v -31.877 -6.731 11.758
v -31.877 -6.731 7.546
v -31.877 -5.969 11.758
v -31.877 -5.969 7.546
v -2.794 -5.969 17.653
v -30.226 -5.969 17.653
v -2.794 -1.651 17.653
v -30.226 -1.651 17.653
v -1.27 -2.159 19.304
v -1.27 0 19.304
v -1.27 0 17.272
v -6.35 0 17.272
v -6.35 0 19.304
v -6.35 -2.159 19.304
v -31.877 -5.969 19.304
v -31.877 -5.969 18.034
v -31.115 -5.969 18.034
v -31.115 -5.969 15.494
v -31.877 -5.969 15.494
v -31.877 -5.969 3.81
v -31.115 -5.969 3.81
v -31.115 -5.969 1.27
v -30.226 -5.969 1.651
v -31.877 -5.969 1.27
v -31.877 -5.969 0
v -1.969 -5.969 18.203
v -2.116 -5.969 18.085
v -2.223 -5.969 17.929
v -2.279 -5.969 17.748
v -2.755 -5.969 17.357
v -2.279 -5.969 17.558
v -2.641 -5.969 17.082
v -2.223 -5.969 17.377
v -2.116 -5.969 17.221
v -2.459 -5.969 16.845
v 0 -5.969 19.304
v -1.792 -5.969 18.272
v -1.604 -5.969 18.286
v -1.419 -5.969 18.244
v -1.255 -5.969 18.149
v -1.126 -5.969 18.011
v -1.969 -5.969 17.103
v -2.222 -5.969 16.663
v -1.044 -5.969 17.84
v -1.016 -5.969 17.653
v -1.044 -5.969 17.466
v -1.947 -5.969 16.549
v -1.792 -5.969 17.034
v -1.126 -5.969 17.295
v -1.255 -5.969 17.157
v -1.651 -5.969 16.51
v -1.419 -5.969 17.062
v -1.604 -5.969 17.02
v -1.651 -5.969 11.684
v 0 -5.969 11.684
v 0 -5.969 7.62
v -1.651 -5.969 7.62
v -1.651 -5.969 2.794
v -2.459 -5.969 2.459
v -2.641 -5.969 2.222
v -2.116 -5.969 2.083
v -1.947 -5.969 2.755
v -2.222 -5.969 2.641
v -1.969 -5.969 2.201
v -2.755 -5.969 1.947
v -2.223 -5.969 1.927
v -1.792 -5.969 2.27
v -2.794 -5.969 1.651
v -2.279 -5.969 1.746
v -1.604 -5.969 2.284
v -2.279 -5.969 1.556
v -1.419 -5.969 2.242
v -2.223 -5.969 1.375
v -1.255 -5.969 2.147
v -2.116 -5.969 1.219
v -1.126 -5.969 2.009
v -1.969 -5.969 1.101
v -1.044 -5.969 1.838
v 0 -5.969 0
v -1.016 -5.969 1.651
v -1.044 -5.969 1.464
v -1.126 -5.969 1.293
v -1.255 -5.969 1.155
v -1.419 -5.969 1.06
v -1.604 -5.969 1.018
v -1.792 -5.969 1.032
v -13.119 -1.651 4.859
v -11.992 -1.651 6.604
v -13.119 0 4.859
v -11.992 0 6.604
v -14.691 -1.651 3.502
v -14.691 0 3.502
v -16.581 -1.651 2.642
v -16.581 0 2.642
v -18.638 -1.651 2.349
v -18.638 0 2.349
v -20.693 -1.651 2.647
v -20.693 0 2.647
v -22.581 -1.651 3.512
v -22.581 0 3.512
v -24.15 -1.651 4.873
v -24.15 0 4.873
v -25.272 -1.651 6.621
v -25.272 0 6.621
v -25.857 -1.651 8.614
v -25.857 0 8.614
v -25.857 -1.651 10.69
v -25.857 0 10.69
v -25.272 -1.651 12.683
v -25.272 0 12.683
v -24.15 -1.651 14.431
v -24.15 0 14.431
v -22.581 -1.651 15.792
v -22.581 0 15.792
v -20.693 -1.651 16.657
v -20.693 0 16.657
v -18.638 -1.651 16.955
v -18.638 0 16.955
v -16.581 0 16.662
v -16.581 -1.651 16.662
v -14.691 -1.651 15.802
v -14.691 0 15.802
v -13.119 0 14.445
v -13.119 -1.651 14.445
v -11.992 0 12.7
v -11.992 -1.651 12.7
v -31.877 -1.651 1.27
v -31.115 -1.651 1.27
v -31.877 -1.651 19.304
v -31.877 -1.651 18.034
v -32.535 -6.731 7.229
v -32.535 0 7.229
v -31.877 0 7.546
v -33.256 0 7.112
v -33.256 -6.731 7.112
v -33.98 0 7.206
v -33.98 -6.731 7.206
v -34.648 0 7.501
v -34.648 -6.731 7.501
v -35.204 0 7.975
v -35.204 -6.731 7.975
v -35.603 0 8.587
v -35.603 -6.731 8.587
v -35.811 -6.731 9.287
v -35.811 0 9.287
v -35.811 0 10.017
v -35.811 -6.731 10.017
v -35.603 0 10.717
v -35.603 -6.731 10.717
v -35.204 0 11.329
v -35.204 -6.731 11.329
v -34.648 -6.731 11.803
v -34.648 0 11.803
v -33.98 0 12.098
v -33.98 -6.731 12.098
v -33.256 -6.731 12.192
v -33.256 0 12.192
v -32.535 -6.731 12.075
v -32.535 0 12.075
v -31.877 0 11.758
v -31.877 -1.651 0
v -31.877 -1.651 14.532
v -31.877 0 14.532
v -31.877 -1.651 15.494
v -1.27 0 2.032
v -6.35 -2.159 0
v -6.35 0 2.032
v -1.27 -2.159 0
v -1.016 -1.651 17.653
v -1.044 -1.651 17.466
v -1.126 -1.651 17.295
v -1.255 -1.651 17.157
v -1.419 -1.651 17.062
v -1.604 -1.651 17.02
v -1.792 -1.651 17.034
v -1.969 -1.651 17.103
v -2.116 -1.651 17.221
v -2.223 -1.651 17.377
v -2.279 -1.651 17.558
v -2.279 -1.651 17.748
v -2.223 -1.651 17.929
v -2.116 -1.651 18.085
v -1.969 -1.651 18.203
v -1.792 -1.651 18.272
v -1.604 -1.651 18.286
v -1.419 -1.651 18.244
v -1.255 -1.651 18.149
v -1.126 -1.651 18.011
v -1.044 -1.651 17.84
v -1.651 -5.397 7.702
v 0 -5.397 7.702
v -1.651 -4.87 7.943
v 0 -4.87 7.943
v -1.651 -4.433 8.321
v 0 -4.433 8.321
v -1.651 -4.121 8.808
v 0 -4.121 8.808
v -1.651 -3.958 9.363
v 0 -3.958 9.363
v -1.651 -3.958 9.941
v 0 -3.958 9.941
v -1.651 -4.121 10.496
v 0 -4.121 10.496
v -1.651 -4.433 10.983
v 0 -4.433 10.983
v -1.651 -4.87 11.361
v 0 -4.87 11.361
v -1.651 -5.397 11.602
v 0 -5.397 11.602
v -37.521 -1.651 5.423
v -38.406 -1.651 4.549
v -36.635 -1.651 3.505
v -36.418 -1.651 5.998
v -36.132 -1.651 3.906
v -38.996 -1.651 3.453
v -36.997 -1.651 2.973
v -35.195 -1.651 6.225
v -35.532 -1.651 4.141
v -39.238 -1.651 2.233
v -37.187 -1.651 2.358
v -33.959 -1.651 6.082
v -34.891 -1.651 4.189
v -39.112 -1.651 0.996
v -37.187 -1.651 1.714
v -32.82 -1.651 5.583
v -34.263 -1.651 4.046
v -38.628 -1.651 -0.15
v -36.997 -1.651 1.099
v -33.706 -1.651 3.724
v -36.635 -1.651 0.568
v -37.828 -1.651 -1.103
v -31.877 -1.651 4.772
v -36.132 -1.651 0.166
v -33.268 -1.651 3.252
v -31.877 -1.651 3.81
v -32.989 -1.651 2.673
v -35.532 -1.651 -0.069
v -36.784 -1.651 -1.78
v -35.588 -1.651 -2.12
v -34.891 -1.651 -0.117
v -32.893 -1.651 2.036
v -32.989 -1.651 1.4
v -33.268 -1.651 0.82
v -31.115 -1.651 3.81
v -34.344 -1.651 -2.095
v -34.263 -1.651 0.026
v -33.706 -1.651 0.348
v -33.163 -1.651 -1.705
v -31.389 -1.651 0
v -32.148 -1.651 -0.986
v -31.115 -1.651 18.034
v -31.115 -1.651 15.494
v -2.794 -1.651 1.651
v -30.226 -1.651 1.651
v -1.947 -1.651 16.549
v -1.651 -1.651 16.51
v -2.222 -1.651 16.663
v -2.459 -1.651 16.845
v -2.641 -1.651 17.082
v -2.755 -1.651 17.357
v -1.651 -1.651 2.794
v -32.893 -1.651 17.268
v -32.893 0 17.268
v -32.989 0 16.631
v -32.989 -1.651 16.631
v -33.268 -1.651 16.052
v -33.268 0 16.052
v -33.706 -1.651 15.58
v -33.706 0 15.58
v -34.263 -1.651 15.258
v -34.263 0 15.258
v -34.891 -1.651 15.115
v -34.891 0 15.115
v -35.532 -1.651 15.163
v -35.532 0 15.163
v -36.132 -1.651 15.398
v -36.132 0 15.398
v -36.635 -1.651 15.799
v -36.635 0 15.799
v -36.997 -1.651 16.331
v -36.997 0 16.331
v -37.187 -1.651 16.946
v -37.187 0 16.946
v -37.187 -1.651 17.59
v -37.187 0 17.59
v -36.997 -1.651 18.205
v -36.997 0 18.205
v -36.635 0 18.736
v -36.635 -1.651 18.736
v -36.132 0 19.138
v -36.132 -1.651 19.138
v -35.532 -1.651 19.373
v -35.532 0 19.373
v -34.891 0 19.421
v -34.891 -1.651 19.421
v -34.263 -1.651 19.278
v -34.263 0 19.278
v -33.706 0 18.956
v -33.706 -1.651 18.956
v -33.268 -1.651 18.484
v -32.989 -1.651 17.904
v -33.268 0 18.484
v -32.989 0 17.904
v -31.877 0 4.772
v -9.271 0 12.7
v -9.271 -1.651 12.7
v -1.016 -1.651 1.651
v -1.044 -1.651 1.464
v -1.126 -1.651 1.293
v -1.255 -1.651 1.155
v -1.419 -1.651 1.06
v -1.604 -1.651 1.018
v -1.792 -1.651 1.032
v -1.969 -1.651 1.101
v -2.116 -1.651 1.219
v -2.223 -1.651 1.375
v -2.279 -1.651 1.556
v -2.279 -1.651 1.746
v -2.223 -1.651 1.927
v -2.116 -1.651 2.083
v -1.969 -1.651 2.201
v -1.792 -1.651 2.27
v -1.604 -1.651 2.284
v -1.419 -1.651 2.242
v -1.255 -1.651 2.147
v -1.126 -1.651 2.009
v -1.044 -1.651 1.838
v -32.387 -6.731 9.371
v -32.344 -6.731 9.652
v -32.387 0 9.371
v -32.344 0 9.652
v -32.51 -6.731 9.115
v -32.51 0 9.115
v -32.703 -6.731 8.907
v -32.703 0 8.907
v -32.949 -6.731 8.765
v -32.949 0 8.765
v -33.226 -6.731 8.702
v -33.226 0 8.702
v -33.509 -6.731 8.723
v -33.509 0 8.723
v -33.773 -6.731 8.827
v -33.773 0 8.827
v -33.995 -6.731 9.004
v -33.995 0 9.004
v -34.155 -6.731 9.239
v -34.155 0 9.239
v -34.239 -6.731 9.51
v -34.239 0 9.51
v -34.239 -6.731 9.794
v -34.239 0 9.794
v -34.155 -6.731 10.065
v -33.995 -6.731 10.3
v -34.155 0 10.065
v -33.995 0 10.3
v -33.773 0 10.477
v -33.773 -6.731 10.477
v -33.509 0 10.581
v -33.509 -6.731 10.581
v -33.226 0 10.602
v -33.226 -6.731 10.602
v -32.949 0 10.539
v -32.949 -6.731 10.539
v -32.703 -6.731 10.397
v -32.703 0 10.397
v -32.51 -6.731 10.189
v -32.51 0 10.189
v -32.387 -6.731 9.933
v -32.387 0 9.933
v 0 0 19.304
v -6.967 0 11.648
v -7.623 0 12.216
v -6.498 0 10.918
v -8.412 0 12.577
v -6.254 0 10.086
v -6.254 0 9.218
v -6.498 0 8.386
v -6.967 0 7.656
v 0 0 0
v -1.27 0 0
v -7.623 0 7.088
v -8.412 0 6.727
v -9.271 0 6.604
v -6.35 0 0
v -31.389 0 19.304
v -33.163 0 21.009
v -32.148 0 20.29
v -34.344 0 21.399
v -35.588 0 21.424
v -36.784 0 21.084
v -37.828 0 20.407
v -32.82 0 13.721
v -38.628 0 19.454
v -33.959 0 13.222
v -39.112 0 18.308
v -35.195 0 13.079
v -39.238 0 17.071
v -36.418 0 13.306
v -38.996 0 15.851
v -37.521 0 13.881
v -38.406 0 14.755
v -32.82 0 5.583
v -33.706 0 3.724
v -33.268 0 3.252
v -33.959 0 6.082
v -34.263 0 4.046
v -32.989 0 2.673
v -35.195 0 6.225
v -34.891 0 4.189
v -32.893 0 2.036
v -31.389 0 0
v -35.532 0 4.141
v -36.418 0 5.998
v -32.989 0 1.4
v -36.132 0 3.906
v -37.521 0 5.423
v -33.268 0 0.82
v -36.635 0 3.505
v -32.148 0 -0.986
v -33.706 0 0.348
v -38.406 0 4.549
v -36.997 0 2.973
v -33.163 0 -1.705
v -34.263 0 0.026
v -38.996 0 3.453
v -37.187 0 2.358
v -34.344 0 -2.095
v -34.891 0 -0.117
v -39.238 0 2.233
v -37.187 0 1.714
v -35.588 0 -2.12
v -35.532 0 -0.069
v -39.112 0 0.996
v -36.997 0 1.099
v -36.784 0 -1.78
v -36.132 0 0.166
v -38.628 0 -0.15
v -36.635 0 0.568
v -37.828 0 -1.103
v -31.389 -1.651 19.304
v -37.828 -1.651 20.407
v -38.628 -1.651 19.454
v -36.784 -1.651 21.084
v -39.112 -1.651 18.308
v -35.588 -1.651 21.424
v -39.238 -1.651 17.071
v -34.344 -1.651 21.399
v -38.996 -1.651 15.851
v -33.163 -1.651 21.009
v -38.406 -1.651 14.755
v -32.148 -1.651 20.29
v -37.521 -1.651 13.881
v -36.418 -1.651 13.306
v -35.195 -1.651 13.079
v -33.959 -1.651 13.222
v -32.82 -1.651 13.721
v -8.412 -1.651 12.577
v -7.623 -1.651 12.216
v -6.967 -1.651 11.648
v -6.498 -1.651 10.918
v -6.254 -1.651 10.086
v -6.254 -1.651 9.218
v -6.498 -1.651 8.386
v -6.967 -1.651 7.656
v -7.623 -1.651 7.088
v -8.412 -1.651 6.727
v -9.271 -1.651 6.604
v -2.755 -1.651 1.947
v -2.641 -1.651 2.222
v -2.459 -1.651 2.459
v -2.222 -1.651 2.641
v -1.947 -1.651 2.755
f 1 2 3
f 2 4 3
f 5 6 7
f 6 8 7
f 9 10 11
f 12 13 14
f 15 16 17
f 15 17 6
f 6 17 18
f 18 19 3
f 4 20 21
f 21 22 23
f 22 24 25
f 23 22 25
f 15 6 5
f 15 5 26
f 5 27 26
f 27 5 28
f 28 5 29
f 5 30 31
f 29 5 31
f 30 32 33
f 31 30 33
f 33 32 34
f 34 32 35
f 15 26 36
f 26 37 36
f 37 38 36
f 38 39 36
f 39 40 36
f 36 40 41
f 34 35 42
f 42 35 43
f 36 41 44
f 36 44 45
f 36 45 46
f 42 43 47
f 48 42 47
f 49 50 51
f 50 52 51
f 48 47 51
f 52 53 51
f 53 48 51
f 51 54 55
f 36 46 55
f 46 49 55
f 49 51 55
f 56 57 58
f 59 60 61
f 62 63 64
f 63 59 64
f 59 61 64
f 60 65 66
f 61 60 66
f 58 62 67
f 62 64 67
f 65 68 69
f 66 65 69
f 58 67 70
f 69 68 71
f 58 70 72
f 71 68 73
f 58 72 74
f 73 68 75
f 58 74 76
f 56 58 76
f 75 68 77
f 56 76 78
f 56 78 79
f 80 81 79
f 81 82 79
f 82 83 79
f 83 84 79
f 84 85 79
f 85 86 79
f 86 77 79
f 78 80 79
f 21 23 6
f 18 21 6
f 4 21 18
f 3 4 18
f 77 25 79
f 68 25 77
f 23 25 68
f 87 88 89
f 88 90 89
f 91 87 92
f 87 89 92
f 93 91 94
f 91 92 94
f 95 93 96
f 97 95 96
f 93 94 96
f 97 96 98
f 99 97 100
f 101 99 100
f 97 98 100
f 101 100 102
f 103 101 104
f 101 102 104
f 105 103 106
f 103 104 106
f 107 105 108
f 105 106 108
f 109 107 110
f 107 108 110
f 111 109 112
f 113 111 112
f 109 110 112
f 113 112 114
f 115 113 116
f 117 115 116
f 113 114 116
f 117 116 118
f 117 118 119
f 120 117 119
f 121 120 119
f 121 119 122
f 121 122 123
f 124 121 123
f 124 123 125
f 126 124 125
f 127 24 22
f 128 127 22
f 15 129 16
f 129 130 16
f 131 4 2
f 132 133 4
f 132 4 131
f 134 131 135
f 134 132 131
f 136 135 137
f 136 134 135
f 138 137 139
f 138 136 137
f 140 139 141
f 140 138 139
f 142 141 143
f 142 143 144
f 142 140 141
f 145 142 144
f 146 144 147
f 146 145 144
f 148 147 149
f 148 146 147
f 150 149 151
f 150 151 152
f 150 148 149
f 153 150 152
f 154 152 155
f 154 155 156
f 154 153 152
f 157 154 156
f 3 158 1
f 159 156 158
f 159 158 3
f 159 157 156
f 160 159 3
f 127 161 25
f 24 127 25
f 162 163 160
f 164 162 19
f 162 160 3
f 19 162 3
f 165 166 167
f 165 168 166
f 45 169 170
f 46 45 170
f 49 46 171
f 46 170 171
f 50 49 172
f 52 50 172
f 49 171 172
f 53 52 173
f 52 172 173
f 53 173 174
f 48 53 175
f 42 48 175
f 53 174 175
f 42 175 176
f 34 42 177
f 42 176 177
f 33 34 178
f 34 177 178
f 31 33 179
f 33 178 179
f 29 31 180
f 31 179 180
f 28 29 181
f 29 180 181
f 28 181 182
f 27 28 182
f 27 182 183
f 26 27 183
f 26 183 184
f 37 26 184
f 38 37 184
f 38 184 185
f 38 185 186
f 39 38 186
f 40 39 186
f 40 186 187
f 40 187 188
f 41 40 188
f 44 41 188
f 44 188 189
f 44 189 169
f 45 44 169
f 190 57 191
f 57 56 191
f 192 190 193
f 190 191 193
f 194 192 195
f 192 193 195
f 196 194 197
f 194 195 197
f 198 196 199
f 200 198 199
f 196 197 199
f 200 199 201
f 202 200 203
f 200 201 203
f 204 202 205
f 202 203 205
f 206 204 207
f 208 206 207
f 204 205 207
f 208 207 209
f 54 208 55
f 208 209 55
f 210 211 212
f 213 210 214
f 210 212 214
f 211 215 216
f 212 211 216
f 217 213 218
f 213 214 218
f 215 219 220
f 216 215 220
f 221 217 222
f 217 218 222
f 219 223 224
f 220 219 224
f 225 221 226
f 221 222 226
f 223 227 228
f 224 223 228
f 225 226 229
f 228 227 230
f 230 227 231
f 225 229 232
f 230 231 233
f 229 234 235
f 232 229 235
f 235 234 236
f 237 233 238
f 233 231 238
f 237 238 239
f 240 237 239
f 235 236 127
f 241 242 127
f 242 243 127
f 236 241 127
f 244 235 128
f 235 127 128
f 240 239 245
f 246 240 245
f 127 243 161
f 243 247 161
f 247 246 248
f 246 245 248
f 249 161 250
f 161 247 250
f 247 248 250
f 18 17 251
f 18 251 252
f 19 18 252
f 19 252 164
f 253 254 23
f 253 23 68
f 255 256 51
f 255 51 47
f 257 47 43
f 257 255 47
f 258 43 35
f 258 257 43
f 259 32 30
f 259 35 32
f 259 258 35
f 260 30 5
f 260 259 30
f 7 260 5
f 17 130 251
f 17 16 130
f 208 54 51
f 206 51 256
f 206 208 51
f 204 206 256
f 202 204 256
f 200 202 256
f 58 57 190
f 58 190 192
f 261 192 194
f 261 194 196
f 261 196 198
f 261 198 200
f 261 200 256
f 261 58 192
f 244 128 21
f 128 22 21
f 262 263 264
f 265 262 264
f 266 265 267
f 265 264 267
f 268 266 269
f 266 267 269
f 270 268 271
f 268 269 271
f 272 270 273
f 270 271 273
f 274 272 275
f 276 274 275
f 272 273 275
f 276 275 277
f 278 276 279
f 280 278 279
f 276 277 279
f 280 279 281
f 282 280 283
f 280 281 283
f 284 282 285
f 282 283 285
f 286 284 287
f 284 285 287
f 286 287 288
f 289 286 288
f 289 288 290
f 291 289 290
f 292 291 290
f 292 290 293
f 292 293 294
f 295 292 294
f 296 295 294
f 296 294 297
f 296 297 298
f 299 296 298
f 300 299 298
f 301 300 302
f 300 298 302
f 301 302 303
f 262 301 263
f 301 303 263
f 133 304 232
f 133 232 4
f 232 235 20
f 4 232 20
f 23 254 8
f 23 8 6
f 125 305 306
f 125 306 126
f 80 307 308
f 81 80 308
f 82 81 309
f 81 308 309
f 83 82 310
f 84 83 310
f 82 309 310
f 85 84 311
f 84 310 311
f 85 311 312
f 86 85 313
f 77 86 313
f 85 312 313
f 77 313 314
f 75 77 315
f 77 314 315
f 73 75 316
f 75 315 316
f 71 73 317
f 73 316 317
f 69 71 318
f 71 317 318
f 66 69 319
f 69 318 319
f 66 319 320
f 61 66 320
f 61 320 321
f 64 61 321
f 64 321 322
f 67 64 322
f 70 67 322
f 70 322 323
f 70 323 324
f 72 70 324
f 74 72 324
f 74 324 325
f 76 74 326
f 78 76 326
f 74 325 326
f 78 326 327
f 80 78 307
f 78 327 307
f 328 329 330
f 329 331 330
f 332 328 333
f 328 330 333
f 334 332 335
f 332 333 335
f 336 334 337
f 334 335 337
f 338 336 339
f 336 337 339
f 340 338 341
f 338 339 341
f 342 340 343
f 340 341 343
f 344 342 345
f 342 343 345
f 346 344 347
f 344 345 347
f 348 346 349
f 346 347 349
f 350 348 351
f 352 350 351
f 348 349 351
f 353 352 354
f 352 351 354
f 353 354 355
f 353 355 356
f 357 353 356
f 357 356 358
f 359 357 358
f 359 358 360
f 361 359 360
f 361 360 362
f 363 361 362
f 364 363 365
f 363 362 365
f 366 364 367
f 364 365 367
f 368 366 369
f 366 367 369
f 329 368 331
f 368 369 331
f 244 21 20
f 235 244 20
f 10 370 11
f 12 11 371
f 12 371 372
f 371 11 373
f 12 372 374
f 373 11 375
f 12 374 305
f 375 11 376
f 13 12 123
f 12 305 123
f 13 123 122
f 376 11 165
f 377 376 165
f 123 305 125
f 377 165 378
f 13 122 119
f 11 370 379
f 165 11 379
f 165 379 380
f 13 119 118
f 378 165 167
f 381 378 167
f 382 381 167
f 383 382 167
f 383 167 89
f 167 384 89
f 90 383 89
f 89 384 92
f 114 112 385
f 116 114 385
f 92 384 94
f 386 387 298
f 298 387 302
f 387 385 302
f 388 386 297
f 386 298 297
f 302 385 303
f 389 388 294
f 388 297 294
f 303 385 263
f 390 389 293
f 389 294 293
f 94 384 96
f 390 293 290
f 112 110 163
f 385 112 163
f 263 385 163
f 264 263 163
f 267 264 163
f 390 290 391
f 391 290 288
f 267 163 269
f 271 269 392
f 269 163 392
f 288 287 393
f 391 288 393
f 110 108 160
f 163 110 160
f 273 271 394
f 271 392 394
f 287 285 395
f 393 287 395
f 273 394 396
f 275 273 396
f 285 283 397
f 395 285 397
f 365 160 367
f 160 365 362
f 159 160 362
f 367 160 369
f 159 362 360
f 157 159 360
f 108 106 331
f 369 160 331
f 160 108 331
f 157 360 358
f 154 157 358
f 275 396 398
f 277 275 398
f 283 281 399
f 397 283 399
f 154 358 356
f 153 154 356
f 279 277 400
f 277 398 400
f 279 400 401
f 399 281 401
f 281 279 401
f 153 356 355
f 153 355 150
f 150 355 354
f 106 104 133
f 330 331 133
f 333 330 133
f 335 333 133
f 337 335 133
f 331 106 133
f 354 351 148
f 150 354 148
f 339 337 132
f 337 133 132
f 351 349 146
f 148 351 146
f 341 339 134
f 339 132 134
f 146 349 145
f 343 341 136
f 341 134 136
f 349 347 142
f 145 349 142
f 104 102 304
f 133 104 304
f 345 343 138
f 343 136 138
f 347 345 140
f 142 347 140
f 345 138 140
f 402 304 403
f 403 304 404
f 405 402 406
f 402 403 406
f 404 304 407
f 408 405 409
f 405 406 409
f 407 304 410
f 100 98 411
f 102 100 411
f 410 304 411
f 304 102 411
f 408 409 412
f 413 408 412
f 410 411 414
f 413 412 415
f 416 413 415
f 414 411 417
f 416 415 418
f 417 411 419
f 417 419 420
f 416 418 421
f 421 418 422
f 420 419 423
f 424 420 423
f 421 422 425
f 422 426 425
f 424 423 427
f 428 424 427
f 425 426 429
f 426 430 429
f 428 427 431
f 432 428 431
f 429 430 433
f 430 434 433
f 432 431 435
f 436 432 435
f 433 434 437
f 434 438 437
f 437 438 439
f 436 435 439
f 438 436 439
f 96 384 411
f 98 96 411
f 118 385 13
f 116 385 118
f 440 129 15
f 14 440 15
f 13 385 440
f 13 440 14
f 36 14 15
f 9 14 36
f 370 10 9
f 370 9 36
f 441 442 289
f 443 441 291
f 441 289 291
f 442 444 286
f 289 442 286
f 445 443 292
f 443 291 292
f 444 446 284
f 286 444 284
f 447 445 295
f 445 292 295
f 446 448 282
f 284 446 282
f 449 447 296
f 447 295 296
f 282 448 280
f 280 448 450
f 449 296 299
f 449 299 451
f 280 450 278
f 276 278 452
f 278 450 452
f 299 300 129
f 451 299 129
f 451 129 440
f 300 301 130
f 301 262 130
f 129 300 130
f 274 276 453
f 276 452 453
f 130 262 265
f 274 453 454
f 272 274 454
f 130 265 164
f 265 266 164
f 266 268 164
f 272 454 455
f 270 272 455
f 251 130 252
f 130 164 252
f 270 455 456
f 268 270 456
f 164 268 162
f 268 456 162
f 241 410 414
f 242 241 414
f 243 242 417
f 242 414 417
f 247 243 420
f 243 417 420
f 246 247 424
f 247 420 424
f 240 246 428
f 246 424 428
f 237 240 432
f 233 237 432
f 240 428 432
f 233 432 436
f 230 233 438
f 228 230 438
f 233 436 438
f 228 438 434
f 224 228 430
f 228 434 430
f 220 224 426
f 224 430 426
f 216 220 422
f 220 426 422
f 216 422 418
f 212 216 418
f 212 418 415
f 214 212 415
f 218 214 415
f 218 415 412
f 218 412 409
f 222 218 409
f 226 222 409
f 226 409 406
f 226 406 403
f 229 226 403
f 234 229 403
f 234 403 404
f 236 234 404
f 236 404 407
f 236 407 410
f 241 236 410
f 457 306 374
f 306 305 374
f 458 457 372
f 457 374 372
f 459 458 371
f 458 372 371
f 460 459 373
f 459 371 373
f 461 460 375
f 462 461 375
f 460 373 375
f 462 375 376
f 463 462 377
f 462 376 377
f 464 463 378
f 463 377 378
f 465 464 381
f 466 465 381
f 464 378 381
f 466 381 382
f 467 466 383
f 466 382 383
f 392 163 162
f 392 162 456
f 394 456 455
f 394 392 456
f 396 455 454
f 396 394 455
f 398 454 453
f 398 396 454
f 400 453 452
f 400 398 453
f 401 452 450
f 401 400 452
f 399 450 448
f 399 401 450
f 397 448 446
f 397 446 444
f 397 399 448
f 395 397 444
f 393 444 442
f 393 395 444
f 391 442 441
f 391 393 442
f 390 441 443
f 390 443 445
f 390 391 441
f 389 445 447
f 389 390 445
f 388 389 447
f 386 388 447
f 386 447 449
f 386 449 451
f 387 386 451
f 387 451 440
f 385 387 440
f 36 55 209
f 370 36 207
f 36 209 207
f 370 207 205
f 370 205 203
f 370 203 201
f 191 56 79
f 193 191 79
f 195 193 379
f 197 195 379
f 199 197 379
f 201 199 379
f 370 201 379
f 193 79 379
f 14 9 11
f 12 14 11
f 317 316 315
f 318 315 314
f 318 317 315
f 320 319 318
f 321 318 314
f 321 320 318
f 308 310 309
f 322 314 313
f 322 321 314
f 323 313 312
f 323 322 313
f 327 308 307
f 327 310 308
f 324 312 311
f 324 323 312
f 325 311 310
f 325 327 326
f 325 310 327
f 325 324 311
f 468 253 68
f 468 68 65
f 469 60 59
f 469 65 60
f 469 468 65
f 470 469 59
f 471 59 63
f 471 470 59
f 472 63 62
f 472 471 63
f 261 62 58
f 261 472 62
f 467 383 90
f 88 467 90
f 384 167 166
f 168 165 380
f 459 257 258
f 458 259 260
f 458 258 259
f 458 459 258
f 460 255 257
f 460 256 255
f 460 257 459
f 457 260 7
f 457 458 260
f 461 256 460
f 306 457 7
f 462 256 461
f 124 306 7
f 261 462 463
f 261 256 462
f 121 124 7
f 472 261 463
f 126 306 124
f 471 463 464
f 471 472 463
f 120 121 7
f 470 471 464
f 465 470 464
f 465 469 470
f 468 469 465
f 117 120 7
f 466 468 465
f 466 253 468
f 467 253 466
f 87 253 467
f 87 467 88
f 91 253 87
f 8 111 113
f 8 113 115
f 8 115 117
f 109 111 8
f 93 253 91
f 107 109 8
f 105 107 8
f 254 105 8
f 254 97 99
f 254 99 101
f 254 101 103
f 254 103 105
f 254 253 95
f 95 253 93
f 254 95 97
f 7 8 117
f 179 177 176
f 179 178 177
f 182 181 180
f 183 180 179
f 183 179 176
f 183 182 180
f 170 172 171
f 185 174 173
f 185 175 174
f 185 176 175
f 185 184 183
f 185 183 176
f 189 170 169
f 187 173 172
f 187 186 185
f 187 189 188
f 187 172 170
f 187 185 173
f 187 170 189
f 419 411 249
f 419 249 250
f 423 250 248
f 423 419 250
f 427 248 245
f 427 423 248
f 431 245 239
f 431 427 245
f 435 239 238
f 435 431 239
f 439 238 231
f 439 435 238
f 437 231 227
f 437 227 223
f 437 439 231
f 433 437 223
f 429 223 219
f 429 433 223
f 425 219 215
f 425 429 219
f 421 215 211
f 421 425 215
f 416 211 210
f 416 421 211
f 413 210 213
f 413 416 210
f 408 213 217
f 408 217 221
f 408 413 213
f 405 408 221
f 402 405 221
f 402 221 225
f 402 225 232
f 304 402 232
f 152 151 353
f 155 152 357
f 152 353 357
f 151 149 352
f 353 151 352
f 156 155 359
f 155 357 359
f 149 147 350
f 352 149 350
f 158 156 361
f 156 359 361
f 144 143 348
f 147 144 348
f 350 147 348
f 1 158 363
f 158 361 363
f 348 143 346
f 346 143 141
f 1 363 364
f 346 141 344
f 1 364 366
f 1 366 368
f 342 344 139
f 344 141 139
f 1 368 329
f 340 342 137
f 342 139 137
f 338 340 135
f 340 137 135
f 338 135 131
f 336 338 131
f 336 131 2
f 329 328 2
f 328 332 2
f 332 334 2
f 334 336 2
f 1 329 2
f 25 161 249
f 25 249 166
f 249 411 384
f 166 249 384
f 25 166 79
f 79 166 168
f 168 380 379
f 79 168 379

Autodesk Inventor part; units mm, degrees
ref_plane "YZ Plane" through (0, 0, 0) normal (1, 0, 0) x (0, 1, 0)
ref_plane "XZ Plane" through (0, 0, 0) normal (0, 1, 0) x (-1, 0, 0)
ref_plane "XY Plane" through (0, 0, 0) normal (0, 0, 1) x (1, 0, 0)
sketch "Sketch1" plane through (0, 0, 0) normal (0, 0, 1) x (1, 0, 0)
  line L0 (0, 0) -> (-31.877, 0)
  line L1 (-31.877, 0) -> (-31.877, -5.969)
  line L2 (-31.877, -5.969) -> (0, -5.969)
  line L3 (0, -5.969) -> (0, 0)
  dimension "d0" = 31.877
  dimension "d1" = 5.969
extrude "Extrusion1" add sketch "Sketch1" along normal blind 19.304
shell "Shell1" thickness 1.651 removed faces 1 at (-21.2513, -5.969, 12.8693)
sketch "Sketch2" plane through (-31.877, 0, 0) normal (0, 1, 0) x (1, 0, 0)
  arc A0 (19.8846, -6.604) -> (19.8846, -12.7) centre (13.2486, -9.652) ccw
  arc A1 (0, -7.5459) -> (0, -11.7581) centre (-1.4199, -9.652) ccw
  line L0 (0, 0) -> (0, -19.304) projected
  line L1 (0, 0) -> (0, -19.304) projected
  circle A2 centre (-1.4199, -9.652) radius 0.9525
  arc A3 (22.606, -12.7) -> (22.606, -6.604) centre (22.606, -9.652) ccw
  line L2 (31.877, 0) -> (31.877, -19.304) projected
  line L3 (22.606, -12.7) -> (19.8846, -12.7)
  line L4 (22.606, -6.604) -> (19.8846, -6.604)
  circle A4 centre (-3.175, -17.2678) radius 2.159
  arc A5 (0, -14.5321) -> (0.4881, -19.304) centre (-3.175, -17.2678) ccw
  line L5 (31.877, -19.304) -> (0, -19.304) construction
  line L6 (13.2486, -9.652) -> (-12.5267, -9.652) construction
  circle A6 centre (-3.175, -2.0362) radius 2.159
  arc A7 (0.4881, 0) -> (0, -4.7719) centre (-3.175, -2.0362) ccw
  line L7 (31.877, 0) -> (0, 0) projected
  line L8 (0, 0) -> (0, -19.304) projected
  line L9 (31.877, -19.304) -> (0, -19.304) projected
  line L10 (31.877, 0) -> (31.877, -19.304) projected
  point P0 (-3.9599, -9.652)
  point P1 (0, -9.652)
  point P2 (5.9461, -9.652)
  point P3 (13.2486, -2.3495)
  point P4 (25.654, -9.652)
  point P5 (-7.366, -17.2678)
  point P6 (-1.4199, -12.192)
  point P7 (-1.4199, -13.462)
  point P8 (0.4881, 0)
  point P9 (0, -4.7719)
  point P10 (0.4881, -19.304)
  point P11 (0, -14.5321)
  dimension "d5" = 14.605
  dimension "d6" = 5.08
  dimension "d8" = 1.905
  dimension "d11" = 9.906
  dimension "d12" = 6.223
  dimension "d13" = 6.096
  dimension "d16" = 4.318
  dimension "d17" = 2.032
  dimension "d18" = 7.366
  dimension "d19" = 1.27
extrude "Extrusion2" add sketch "Sketch2" against normal blind 6.731 contours L0 A1
extrude "Extrusion3" cut sketch "Sketch2" against normal through all contours L4 A3 L3 A0
extrude "Extrusion4" add sketch "Sketch2" against normal blind 1.651 contours A7 L7 L0 | L0 L9 A5
sketch "Sketch3" plane through (0, -5.969, 0) normal (1, 0, 0) x (0, 0, -1)
  line L0 (0, 0) -> (-19.304, 0) projected
  arc A0 (-7.62, 0) -> (-11.684, 0) centre (-9.652, 0) ccw
  line L1 (0, 0) -> (0, 5.969) projected
  line L2 (0, 5.969) -> (-19.304, 5.969) projected
  line L3 (-19.304, 0) -> (-19.304, 5.969) projected
  line L4 (0, 0) -> (-19.304, 0) projected
  point P0 (-7.62, 0)
extrude "Extrusion5" cut sketch "Sketch3" against normal up to surface (1.651 mm away) contours L0 A0
ref_plane "Work Plane1" through (-1.27, -5.969, 0) normal (1, 0, 0) x (0, 0, -1)
sketch "Sketch4" plane through (-1.27, -5.969, 0) normal (1, 0, 0) x (0, 0, -1)
  line L0 (0, 4.318) -> (0, 0) projected
  line L1 (0, 3.81) -> (-2.032, 5.969)
  line L2 (-4.1952, 5.969) -> (0.1228, 5.969) projected
  line L3 (-2.032, 5.969) -> (0, 5.969)
  line L4 (0, 3.81) -> (0, 5.969)
  line L5 (0, 5.969) -> (-19.304, 5.969) construction
  line L6 (-9.652, 5.969) -> (-9.652, 0) construction
  line L7 (-1.651, 0) -> (-17.653, 0) construction
  line L8 (-19.304, 3.81) -> (-17.272, 5.969)
  line L9 (-19.304, 3.81) -> (-19.304, 5.969)
  line L10 (-19.304, 5.969) -> (-19.304, 4.318) projected
  line L11 (-19.304, 5.969) -> (-17.272, 5.969)
  dimension "d27" = 3.81
  dimension "d28" = 2.032
extrude "Extrusion6" cut sketch "Sketch4" against normal blind 5.08
sketch "Sketch5" plane through (-31.877, -5.969, 0) normal (0, -1, 0) x (1, 0, 0)
  line L0 (0, 11.7581) -> (0, 19.304) projected
  line L1 (0, 18.034) -> (0.762, 18.034)
  line L2 (0.762, 18.034) -> (0.762, 15.494)
  line L3 (0.762, 15.494) -> (0, 15.494)
  line L4 (0, 15.494) -> (0, 18.034)
  line L5 (0, 19.304) -> (31.877, 19.304) projected
  line L6 (0, 7.5459) -> (0, 11.7581) construction
  line L7 (0, 9.652) -> (31.877, 9.652) construction
  line L8 (31.877, 0) -> (31.877, 19.304) construction
  line L9 (0, 1.27) -> (0.762, 1.27)
  line L10 (0.762, 1.27) -> (0.762, 3.81)
  line L11 (0.762, 3.81) -> (0, 3.81)
  line L12 (0, 3.81) -> (0, 1.27)
  point P0 (0, 15.494)
  dimension "d31" = 0.762
  dimension "d32" = 2.54
  dimension "d33" = 1.27
extrude "Extrusion7" cut sketch "Sketch5" against normal up to surface (4.318 mm away)
sketch "Sketch6" plane through (-30.226, -1.651, 1.651) normal (0, -1, 0) x (1, 0, 0)
  circle A0 centre (28.575, 0) radius 0.635
  circle A1 centre (28.575, 0) radius 1.143
  line L0 (28.575, 0) -> (0, 0) projected
  line L1 (28.575, 5.969) -> (28.575, 0) projected
  line L2 (30.226, -1.651) -> (30.226, 17.653) construction
  line L3 (30.226, 8.001) -> (-7.0549, 8.001) construction
  circle A2 centre (28.575, 16.002) radius 0.635
  circle A3 centre (28.575, 16.002) radius 1.143
  point P0 (27.432, 0)
  point P1 (28.575, 1.143)
  point P2 (28.575, 0.635)
  point P3 (27.94, 0)
  dimension "d36" = 1.27
  dimension "d37" = 0.508
extrude "Extrusion8" add sketch "Sketch6" along normal up to surface (4.318 mm away) contours A0 L0 A1 L1 | A3 picked at (27.6162, 0.1319)
extrude "Extrusion9" cut sketch "Sketch6" along normal up to surface (4.318 mm away) contours A0 L0 L1 | L1 L0 A0 | A2
properties part number "Back Half Torso" material "Phenolic Resin"
